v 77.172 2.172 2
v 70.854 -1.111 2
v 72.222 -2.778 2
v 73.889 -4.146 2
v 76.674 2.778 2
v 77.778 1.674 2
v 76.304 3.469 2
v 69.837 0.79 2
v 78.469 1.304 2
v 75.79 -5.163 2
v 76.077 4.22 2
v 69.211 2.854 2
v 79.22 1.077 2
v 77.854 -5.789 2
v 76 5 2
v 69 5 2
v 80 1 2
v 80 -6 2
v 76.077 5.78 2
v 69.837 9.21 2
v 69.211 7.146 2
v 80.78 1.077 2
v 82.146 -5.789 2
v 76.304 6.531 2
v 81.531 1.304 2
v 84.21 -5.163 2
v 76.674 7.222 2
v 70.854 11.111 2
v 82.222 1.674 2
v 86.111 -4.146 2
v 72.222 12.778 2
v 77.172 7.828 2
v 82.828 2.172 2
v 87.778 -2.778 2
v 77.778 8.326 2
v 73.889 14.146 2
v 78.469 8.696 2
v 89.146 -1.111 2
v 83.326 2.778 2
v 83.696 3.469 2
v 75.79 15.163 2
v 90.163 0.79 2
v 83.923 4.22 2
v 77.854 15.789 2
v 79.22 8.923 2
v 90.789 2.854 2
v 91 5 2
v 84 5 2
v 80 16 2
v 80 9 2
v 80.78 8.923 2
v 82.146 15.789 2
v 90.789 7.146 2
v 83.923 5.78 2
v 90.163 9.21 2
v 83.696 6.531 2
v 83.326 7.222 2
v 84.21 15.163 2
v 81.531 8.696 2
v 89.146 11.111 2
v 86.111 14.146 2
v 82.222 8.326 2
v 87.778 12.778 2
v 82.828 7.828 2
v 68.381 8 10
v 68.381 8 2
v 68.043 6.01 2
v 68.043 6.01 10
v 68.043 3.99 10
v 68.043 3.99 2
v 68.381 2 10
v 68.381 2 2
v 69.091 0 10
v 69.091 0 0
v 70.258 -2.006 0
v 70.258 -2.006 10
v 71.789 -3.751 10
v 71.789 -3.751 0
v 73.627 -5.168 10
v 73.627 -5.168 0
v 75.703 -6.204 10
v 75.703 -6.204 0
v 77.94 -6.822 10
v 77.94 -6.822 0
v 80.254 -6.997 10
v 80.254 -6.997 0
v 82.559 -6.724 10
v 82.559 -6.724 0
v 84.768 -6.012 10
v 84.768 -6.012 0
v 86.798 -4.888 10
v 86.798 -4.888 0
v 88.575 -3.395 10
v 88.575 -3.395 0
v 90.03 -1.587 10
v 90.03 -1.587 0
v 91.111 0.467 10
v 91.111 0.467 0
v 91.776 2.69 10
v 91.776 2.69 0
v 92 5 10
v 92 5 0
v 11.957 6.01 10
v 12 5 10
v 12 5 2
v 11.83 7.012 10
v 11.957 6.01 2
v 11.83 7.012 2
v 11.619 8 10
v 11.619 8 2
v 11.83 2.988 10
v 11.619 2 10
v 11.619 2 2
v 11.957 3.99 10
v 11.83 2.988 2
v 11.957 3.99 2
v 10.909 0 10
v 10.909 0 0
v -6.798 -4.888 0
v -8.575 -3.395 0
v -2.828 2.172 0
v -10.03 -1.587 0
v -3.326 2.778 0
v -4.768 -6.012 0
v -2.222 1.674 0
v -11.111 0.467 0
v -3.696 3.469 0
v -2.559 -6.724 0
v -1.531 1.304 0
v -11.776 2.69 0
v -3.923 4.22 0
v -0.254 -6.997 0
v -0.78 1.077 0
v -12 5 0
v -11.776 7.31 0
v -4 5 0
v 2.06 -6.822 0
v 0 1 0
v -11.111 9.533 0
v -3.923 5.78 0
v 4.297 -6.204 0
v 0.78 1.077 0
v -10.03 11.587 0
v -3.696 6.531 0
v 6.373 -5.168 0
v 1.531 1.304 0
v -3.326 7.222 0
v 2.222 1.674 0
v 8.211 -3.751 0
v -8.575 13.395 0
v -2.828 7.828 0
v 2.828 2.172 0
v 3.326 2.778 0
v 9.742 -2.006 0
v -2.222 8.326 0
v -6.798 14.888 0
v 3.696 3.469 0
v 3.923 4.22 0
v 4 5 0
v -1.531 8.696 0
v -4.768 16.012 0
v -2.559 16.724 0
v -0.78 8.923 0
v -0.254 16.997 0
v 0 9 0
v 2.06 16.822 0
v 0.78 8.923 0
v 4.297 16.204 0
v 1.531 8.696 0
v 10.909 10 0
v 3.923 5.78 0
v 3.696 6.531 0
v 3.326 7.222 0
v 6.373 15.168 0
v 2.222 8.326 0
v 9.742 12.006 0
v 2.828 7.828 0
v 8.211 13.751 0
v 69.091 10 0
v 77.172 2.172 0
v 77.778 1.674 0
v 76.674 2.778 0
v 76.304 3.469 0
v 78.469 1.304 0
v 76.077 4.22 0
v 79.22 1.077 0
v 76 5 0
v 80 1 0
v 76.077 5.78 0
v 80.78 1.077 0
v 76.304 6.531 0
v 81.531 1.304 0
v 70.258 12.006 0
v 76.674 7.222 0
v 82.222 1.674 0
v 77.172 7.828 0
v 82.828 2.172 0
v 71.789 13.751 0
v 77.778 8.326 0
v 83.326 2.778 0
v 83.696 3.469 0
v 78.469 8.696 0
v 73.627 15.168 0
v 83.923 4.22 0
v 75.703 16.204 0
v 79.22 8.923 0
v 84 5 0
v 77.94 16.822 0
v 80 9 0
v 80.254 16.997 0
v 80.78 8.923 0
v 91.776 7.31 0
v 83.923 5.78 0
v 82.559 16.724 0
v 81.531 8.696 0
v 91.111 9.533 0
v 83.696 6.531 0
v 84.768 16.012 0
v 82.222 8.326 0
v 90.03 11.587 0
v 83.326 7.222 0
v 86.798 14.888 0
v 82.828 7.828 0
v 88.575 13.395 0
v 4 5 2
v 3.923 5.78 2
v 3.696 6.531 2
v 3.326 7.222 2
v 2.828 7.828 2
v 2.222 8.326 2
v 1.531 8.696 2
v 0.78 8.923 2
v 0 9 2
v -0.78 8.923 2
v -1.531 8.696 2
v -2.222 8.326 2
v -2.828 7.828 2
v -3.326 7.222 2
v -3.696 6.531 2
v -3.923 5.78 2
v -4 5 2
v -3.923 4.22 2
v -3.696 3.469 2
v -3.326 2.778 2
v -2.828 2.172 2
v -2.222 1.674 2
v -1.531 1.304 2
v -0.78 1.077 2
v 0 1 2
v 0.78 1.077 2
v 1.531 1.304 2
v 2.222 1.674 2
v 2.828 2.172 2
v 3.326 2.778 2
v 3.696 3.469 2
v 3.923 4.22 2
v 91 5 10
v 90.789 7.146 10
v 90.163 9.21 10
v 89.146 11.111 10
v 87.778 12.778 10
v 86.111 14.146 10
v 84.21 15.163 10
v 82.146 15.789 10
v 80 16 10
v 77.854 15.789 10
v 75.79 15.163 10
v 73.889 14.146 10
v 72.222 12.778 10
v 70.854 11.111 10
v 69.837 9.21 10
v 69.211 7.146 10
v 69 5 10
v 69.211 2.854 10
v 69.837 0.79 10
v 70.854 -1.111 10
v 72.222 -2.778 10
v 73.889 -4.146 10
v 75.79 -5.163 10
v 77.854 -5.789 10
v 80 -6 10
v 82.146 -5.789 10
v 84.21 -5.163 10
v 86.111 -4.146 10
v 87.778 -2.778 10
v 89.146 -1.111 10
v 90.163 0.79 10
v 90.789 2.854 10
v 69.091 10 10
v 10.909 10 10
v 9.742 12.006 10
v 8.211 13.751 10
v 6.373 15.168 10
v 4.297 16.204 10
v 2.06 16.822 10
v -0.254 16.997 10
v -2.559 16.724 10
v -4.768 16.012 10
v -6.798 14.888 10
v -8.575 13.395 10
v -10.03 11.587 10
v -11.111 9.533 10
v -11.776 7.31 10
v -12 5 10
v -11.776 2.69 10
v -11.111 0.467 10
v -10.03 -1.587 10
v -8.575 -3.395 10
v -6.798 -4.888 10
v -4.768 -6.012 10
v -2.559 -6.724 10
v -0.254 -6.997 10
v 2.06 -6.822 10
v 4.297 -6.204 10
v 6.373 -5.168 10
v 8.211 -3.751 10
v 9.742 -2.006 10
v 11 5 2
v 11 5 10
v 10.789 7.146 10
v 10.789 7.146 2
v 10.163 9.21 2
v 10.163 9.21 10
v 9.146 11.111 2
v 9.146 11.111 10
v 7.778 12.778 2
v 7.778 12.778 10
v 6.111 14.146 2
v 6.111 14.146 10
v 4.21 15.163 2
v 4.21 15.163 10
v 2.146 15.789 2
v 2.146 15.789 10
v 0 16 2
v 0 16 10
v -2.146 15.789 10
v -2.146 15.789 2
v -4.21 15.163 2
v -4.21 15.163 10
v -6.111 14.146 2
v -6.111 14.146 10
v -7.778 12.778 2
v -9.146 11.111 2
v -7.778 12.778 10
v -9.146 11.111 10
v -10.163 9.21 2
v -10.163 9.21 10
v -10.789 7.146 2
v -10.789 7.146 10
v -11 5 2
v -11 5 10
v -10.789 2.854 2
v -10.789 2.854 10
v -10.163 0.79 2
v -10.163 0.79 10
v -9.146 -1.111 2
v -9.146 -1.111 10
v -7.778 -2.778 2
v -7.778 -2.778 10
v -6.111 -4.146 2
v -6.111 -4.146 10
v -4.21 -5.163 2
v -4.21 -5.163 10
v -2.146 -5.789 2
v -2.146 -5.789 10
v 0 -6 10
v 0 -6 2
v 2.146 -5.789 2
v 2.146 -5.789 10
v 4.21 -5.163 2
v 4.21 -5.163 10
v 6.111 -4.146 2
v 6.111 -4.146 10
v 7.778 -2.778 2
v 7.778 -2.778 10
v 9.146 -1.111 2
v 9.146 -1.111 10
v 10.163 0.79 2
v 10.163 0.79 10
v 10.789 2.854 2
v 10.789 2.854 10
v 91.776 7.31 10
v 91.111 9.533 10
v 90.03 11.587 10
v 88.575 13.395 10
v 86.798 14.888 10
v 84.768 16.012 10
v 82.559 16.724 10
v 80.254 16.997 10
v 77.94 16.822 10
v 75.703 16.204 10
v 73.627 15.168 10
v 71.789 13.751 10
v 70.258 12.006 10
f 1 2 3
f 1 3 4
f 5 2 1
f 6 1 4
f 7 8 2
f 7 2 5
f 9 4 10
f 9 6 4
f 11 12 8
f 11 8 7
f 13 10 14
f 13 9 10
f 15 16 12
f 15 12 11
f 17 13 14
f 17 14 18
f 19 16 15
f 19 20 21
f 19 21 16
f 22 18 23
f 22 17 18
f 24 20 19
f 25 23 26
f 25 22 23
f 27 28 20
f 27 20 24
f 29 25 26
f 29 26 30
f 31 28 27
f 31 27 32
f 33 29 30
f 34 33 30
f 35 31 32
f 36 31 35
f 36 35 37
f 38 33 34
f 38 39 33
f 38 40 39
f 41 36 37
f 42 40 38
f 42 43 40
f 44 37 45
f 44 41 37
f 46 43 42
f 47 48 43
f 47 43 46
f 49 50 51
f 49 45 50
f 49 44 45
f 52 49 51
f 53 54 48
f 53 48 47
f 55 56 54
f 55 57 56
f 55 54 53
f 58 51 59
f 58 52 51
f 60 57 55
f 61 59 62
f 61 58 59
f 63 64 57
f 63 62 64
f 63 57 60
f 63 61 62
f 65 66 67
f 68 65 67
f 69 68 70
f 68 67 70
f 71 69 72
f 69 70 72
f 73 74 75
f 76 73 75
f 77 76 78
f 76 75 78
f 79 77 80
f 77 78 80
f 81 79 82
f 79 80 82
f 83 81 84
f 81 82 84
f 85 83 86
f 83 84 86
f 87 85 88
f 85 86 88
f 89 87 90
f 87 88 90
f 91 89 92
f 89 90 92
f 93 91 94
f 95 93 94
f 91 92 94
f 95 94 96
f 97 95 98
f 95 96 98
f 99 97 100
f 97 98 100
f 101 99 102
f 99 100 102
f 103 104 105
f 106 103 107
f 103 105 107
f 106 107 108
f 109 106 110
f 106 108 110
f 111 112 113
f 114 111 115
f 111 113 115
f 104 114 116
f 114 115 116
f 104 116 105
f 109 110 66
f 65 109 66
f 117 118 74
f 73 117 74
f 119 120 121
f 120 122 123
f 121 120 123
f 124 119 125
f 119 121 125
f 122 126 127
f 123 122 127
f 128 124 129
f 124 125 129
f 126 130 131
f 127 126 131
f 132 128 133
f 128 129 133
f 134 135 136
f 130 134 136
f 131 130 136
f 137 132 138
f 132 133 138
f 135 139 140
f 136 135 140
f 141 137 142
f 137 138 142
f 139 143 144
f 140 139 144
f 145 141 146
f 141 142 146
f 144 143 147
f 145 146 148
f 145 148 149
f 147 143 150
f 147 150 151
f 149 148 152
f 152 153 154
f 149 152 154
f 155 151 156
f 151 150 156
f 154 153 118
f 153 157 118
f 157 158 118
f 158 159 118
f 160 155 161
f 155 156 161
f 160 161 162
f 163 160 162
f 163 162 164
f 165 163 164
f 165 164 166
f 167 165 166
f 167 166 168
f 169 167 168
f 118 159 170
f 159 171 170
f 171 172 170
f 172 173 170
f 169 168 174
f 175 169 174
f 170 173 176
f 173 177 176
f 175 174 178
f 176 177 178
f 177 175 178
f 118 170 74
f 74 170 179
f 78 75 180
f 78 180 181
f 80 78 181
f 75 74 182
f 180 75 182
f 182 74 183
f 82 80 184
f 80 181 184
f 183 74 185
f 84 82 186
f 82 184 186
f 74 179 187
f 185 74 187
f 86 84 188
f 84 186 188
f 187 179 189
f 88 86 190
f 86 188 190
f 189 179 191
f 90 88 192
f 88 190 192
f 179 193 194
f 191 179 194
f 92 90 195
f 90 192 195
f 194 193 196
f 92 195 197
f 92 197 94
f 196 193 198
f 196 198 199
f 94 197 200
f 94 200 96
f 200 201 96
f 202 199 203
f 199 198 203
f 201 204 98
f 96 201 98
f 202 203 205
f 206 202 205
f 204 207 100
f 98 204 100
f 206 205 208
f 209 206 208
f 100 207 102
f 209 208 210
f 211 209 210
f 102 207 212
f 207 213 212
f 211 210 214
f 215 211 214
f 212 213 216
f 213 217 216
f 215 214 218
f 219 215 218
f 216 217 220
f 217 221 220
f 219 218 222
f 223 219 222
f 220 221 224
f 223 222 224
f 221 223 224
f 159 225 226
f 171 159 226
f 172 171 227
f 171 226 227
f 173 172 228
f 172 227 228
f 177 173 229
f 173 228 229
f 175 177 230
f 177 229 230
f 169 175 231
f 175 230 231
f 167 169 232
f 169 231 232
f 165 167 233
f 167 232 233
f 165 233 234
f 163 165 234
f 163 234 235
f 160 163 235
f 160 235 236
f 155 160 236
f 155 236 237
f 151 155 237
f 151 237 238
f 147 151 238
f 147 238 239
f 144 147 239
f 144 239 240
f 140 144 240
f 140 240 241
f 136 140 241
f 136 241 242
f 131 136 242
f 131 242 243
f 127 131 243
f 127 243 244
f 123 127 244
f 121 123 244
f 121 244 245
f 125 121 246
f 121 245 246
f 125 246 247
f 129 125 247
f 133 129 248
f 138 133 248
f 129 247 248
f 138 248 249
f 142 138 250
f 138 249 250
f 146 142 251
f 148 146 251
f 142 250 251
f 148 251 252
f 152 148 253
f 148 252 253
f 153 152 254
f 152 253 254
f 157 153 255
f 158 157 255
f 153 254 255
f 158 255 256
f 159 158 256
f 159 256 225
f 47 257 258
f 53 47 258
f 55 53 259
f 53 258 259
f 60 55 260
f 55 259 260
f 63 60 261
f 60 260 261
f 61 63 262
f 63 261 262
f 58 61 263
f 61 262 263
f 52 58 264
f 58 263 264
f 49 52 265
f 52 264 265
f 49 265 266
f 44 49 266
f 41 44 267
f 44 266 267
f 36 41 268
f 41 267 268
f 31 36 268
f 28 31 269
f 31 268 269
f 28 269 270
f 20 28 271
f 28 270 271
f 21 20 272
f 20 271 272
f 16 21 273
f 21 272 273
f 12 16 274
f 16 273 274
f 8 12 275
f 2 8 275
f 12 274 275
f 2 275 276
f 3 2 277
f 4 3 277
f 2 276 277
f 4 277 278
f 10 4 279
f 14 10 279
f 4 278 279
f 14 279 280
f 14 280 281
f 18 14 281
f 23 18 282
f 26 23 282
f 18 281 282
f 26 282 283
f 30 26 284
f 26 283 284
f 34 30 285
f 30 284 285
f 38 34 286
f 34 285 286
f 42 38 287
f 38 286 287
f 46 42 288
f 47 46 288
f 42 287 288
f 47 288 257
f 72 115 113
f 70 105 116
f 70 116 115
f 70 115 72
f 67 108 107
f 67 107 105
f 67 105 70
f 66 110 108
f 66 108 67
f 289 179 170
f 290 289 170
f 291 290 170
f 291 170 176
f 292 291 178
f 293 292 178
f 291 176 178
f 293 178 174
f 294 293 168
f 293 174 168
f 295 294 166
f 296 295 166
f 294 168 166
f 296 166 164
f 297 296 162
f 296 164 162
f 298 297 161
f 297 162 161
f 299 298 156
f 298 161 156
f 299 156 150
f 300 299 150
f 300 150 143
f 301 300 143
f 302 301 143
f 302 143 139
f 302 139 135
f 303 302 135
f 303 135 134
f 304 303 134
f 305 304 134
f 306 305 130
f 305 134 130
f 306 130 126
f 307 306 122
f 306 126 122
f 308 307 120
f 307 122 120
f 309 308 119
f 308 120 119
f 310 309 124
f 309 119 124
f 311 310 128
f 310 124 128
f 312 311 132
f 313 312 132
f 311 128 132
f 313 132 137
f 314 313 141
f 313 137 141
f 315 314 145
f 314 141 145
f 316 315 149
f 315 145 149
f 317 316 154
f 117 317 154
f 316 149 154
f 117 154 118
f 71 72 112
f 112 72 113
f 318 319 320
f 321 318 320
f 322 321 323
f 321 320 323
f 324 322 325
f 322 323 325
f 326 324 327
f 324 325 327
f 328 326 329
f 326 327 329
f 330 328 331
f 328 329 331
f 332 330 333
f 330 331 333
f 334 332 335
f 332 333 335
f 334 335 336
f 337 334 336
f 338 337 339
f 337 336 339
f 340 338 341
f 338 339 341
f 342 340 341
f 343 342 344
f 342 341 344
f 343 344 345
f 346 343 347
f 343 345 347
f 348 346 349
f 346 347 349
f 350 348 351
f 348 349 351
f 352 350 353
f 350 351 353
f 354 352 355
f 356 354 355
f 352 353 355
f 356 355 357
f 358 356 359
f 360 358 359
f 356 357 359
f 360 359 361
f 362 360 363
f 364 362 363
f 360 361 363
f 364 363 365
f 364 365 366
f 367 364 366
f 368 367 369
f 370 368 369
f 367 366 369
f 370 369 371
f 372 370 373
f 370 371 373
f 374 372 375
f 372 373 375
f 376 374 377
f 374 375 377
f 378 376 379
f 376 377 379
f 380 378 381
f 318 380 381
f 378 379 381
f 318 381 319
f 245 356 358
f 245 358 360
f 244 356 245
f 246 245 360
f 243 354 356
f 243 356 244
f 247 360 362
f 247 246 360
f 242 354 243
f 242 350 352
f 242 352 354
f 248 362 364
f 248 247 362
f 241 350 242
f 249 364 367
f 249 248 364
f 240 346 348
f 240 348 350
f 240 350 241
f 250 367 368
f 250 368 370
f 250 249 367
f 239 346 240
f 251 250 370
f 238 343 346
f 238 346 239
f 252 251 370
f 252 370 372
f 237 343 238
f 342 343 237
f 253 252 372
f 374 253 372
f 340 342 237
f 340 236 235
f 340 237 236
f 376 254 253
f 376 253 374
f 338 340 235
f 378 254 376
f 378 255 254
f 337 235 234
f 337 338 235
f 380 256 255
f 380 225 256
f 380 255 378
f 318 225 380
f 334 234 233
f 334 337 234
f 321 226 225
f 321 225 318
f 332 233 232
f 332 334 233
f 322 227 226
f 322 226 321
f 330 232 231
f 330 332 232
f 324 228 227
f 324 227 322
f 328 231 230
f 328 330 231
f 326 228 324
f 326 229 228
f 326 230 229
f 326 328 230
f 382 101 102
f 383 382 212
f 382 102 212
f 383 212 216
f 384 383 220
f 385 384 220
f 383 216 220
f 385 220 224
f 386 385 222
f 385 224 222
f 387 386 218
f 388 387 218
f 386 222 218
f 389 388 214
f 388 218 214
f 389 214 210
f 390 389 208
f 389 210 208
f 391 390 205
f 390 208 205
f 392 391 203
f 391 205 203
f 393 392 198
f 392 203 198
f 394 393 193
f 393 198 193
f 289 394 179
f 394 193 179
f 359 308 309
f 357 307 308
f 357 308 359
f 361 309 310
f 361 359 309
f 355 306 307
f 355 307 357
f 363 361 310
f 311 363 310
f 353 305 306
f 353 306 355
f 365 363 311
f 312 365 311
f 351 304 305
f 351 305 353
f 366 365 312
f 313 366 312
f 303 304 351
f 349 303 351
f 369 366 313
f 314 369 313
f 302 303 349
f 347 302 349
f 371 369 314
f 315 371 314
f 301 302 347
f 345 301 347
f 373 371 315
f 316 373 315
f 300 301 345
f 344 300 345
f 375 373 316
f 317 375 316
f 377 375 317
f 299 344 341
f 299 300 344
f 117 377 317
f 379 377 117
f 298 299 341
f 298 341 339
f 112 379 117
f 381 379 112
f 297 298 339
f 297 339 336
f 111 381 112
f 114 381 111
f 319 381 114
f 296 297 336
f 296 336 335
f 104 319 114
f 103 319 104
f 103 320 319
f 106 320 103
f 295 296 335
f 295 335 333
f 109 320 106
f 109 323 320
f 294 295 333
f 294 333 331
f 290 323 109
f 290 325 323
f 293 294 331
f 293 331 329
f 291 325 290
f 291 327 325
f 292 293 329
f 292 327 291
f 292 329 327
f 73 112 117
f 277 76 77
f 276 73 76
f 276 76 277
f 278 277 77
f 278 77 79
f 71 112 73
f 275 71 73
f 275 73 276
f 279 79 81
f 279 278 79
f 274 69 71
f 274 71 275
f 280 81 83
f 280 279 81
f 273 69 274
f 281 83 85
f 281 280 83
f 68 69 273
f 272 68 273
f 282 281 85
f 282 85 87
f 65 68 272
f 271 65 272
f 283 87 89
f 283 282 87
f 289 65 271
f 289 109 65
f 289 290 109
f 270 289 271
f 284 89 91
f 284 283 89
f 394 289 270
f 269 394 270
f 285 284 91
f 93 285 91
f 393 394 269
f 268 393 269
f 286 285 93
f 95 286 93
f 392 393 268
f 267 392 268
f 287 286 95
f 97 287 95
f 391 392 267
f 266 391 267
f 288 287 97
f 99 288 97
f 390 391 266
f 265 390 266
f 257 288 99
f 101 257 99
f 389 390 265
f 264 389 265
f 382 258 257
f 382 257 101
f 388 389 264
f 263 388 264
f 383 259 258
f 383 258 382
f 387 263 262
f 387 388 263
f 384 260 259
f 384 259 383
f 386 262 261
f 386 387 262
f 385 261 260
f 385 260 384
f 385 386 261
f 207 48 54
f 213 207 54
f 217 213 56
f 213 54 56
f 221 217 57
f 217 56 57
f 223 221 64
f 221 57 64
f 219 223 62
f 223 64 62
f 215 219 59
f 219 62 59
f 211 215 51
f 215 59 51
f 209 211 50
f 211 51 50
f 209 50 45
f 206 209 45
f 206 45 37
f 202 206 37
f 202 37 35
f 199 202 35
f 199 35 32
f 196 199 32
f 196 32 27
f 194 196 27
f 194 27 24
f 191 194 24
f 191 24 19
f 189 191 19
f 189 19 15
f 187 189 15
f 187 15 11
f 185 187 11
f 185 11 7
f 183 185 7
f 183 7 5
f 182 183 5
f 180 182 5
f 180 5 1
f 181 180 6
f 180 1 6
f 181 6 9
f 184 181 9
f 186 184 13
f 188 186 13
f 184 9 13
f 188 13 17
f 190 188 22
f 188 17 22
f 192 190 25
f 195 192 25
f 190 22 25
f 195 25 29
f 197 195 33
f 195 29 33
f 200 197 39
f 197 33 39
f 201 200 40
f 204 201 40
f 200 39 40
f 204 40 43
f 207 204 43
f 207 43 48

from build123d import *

# Parameters (mm, degrees)
F1_DEPTH  = 2
F2_DEPTH  = 10
F3_R      = 4
F4_DEPTH  = 10.001
F3_R_2    = 11
F5_DEPTH  = 8
F6_R      = 4
F7_DEPTH  = 10.001
F6_R_2    = 11
F8_DEPTH  = 8
F10_DEPTH = 8


with BuildPart() as f1:
    # F0 (on Top) → F1 (new body)
    with BuildSketch(Plane.XY):
        with BuildLine():
            ThreePointArc((12, 5), (11.7240041235, 2.4411472664), (10.9087121146, 0))
            Line((10.9087121146, 0), (69.0912878854, 0))
            ThreePointArc((69.0912878854, 0), (68, 5), (69.0912878854, 10))
            Line((69.0912878854, 10), (10.9087121146, 10))
            ThreePointArc((10.9087121146, 10), (11.7240041235, 7.5588527336), (12, 5))
        make_face()
    extrude(amount=F1_DEPTH)

    # F0 (on Top) → F2 (join)
    with BuildSketch(Plane.XY):
        with BuildLine():
            Line((10.9087121146, 0), (0, 0))
            Line((0, 0), (0, 10))
            Line((0, 10), (10.9087121146, 10))
            ThreePointArc((10.9087121146, 10), (-12, 5), (10.9087121146, 0))
        make_face()
        with BuildLine():
            ThreePointArc((69.0912878854, 10), (68, 5), (69.0912878854, 0))
            Line((69.0912878854, 0), (80, 0))
            Line((80, 0), (80, 10))
            Line((80, 10), (69.0912878854, 10))
        make_face()
        with BuildLine():
            Line((80, 0), (69.0912878854, 0))
            ThreePointArc((69.0912878854, 0), (82.5588527336, -6.7240041235), (92, 5))
            ThreePointArc((92, 5), (82.5588527336, 16.7240041235), (69.0912878854, 10))
            Line((69.0912878854, 10), (80, 10))
            Line((80, 10), (80, 0))
        make_face()
        with BuildLine():
            Line((0, 10), (0, 0))
            Line((0, 0), (10.9087121146, 0))
            ThreePointArc((10.9087121146, 0), (11.7240041235, 2.4411472664), (12, 5))
            ThreePointArc((12, 5), (11.7240041235, 7.5588527336), (10.9087121146, 10))
            Line((10.9087121146, 10), (0, 10))
        make_face()
    extrude(amount=F2_DEPTH)

    # F3 (on face) → F4 (cut, through all)
    with BuildSketch(Plane.XY.offset(10)):
        with Locations((0, 5)):
            Circle(F3_R)
    extrude(amount=-F4_DEPTH, mode=Mode.SUBTRACT)

    # F3 (on face) → F5 (cut)
    with BuildSketch(Plane.XY.offset(10)):
        with Locations((0, 5)):
            Circle(F3_R_2)
        with Locations((0, 5)):
            Circle(F3_R, mode=Mode.SUBTRACT)
    extrude(amount=-F5_DEPTH, mode=Mode.SUBTRACT)

    # F6 (on face) → F7 (cut, through all)
    with BuildSketch(Plane.XY.offset(10)):
        with Locations((80, 5)):
            Circle(F6_R)
    extrude(amount=-F7_DEPTH, mode=Mode.SUBTRACT)

    # F6 (on face) → F8 (cut)
    with BuildSketch(Plane.XY.offset(10)):
        with Locations((80, 5)):
            Circle(F6_R_2)
        with Locations((80, 5)):
            Circle(F6_R, mode=Mode.SUBTRACT)
    extrude(amount=-F8_DEPTH, mode=Mode.SUBTRACT)

    # F9 (on face) → F10 (join)
    with BuildSketch(Plane.XY.offset(2)):
        with BuildLine():
            ThreePointArc((10.9087121146, 10), (11.3081338214, 9.0157327447), (11.6189500386, 8))
            Line((11.6189500386, 8), (68.3810499614, 8))
            ThreePointArc((68.3810499614, 8), (68.6918661786, 9.0157327447), (69.0912878854, 10))
            Line((69.0912878854, 10), (10.9087121146, 10))
        make_face()
        with BuildLine():
            ThreePointArc((11.6189500386, 2), (11.3081338214, 0.9842672553), (10.9087121146, 0))
            Line((10.9087121146, 0), (69.0912878854, 0))
            ThreePointArc((69.0912878854, 0), (68.6918661786, 0.9842672553), (68.3810499614, 2))
            Line((68.3810499614, 2), (11.6189500386, 2))
        make_face()
    extrude(amount=F10_DEPTH)


solid = f1.part
